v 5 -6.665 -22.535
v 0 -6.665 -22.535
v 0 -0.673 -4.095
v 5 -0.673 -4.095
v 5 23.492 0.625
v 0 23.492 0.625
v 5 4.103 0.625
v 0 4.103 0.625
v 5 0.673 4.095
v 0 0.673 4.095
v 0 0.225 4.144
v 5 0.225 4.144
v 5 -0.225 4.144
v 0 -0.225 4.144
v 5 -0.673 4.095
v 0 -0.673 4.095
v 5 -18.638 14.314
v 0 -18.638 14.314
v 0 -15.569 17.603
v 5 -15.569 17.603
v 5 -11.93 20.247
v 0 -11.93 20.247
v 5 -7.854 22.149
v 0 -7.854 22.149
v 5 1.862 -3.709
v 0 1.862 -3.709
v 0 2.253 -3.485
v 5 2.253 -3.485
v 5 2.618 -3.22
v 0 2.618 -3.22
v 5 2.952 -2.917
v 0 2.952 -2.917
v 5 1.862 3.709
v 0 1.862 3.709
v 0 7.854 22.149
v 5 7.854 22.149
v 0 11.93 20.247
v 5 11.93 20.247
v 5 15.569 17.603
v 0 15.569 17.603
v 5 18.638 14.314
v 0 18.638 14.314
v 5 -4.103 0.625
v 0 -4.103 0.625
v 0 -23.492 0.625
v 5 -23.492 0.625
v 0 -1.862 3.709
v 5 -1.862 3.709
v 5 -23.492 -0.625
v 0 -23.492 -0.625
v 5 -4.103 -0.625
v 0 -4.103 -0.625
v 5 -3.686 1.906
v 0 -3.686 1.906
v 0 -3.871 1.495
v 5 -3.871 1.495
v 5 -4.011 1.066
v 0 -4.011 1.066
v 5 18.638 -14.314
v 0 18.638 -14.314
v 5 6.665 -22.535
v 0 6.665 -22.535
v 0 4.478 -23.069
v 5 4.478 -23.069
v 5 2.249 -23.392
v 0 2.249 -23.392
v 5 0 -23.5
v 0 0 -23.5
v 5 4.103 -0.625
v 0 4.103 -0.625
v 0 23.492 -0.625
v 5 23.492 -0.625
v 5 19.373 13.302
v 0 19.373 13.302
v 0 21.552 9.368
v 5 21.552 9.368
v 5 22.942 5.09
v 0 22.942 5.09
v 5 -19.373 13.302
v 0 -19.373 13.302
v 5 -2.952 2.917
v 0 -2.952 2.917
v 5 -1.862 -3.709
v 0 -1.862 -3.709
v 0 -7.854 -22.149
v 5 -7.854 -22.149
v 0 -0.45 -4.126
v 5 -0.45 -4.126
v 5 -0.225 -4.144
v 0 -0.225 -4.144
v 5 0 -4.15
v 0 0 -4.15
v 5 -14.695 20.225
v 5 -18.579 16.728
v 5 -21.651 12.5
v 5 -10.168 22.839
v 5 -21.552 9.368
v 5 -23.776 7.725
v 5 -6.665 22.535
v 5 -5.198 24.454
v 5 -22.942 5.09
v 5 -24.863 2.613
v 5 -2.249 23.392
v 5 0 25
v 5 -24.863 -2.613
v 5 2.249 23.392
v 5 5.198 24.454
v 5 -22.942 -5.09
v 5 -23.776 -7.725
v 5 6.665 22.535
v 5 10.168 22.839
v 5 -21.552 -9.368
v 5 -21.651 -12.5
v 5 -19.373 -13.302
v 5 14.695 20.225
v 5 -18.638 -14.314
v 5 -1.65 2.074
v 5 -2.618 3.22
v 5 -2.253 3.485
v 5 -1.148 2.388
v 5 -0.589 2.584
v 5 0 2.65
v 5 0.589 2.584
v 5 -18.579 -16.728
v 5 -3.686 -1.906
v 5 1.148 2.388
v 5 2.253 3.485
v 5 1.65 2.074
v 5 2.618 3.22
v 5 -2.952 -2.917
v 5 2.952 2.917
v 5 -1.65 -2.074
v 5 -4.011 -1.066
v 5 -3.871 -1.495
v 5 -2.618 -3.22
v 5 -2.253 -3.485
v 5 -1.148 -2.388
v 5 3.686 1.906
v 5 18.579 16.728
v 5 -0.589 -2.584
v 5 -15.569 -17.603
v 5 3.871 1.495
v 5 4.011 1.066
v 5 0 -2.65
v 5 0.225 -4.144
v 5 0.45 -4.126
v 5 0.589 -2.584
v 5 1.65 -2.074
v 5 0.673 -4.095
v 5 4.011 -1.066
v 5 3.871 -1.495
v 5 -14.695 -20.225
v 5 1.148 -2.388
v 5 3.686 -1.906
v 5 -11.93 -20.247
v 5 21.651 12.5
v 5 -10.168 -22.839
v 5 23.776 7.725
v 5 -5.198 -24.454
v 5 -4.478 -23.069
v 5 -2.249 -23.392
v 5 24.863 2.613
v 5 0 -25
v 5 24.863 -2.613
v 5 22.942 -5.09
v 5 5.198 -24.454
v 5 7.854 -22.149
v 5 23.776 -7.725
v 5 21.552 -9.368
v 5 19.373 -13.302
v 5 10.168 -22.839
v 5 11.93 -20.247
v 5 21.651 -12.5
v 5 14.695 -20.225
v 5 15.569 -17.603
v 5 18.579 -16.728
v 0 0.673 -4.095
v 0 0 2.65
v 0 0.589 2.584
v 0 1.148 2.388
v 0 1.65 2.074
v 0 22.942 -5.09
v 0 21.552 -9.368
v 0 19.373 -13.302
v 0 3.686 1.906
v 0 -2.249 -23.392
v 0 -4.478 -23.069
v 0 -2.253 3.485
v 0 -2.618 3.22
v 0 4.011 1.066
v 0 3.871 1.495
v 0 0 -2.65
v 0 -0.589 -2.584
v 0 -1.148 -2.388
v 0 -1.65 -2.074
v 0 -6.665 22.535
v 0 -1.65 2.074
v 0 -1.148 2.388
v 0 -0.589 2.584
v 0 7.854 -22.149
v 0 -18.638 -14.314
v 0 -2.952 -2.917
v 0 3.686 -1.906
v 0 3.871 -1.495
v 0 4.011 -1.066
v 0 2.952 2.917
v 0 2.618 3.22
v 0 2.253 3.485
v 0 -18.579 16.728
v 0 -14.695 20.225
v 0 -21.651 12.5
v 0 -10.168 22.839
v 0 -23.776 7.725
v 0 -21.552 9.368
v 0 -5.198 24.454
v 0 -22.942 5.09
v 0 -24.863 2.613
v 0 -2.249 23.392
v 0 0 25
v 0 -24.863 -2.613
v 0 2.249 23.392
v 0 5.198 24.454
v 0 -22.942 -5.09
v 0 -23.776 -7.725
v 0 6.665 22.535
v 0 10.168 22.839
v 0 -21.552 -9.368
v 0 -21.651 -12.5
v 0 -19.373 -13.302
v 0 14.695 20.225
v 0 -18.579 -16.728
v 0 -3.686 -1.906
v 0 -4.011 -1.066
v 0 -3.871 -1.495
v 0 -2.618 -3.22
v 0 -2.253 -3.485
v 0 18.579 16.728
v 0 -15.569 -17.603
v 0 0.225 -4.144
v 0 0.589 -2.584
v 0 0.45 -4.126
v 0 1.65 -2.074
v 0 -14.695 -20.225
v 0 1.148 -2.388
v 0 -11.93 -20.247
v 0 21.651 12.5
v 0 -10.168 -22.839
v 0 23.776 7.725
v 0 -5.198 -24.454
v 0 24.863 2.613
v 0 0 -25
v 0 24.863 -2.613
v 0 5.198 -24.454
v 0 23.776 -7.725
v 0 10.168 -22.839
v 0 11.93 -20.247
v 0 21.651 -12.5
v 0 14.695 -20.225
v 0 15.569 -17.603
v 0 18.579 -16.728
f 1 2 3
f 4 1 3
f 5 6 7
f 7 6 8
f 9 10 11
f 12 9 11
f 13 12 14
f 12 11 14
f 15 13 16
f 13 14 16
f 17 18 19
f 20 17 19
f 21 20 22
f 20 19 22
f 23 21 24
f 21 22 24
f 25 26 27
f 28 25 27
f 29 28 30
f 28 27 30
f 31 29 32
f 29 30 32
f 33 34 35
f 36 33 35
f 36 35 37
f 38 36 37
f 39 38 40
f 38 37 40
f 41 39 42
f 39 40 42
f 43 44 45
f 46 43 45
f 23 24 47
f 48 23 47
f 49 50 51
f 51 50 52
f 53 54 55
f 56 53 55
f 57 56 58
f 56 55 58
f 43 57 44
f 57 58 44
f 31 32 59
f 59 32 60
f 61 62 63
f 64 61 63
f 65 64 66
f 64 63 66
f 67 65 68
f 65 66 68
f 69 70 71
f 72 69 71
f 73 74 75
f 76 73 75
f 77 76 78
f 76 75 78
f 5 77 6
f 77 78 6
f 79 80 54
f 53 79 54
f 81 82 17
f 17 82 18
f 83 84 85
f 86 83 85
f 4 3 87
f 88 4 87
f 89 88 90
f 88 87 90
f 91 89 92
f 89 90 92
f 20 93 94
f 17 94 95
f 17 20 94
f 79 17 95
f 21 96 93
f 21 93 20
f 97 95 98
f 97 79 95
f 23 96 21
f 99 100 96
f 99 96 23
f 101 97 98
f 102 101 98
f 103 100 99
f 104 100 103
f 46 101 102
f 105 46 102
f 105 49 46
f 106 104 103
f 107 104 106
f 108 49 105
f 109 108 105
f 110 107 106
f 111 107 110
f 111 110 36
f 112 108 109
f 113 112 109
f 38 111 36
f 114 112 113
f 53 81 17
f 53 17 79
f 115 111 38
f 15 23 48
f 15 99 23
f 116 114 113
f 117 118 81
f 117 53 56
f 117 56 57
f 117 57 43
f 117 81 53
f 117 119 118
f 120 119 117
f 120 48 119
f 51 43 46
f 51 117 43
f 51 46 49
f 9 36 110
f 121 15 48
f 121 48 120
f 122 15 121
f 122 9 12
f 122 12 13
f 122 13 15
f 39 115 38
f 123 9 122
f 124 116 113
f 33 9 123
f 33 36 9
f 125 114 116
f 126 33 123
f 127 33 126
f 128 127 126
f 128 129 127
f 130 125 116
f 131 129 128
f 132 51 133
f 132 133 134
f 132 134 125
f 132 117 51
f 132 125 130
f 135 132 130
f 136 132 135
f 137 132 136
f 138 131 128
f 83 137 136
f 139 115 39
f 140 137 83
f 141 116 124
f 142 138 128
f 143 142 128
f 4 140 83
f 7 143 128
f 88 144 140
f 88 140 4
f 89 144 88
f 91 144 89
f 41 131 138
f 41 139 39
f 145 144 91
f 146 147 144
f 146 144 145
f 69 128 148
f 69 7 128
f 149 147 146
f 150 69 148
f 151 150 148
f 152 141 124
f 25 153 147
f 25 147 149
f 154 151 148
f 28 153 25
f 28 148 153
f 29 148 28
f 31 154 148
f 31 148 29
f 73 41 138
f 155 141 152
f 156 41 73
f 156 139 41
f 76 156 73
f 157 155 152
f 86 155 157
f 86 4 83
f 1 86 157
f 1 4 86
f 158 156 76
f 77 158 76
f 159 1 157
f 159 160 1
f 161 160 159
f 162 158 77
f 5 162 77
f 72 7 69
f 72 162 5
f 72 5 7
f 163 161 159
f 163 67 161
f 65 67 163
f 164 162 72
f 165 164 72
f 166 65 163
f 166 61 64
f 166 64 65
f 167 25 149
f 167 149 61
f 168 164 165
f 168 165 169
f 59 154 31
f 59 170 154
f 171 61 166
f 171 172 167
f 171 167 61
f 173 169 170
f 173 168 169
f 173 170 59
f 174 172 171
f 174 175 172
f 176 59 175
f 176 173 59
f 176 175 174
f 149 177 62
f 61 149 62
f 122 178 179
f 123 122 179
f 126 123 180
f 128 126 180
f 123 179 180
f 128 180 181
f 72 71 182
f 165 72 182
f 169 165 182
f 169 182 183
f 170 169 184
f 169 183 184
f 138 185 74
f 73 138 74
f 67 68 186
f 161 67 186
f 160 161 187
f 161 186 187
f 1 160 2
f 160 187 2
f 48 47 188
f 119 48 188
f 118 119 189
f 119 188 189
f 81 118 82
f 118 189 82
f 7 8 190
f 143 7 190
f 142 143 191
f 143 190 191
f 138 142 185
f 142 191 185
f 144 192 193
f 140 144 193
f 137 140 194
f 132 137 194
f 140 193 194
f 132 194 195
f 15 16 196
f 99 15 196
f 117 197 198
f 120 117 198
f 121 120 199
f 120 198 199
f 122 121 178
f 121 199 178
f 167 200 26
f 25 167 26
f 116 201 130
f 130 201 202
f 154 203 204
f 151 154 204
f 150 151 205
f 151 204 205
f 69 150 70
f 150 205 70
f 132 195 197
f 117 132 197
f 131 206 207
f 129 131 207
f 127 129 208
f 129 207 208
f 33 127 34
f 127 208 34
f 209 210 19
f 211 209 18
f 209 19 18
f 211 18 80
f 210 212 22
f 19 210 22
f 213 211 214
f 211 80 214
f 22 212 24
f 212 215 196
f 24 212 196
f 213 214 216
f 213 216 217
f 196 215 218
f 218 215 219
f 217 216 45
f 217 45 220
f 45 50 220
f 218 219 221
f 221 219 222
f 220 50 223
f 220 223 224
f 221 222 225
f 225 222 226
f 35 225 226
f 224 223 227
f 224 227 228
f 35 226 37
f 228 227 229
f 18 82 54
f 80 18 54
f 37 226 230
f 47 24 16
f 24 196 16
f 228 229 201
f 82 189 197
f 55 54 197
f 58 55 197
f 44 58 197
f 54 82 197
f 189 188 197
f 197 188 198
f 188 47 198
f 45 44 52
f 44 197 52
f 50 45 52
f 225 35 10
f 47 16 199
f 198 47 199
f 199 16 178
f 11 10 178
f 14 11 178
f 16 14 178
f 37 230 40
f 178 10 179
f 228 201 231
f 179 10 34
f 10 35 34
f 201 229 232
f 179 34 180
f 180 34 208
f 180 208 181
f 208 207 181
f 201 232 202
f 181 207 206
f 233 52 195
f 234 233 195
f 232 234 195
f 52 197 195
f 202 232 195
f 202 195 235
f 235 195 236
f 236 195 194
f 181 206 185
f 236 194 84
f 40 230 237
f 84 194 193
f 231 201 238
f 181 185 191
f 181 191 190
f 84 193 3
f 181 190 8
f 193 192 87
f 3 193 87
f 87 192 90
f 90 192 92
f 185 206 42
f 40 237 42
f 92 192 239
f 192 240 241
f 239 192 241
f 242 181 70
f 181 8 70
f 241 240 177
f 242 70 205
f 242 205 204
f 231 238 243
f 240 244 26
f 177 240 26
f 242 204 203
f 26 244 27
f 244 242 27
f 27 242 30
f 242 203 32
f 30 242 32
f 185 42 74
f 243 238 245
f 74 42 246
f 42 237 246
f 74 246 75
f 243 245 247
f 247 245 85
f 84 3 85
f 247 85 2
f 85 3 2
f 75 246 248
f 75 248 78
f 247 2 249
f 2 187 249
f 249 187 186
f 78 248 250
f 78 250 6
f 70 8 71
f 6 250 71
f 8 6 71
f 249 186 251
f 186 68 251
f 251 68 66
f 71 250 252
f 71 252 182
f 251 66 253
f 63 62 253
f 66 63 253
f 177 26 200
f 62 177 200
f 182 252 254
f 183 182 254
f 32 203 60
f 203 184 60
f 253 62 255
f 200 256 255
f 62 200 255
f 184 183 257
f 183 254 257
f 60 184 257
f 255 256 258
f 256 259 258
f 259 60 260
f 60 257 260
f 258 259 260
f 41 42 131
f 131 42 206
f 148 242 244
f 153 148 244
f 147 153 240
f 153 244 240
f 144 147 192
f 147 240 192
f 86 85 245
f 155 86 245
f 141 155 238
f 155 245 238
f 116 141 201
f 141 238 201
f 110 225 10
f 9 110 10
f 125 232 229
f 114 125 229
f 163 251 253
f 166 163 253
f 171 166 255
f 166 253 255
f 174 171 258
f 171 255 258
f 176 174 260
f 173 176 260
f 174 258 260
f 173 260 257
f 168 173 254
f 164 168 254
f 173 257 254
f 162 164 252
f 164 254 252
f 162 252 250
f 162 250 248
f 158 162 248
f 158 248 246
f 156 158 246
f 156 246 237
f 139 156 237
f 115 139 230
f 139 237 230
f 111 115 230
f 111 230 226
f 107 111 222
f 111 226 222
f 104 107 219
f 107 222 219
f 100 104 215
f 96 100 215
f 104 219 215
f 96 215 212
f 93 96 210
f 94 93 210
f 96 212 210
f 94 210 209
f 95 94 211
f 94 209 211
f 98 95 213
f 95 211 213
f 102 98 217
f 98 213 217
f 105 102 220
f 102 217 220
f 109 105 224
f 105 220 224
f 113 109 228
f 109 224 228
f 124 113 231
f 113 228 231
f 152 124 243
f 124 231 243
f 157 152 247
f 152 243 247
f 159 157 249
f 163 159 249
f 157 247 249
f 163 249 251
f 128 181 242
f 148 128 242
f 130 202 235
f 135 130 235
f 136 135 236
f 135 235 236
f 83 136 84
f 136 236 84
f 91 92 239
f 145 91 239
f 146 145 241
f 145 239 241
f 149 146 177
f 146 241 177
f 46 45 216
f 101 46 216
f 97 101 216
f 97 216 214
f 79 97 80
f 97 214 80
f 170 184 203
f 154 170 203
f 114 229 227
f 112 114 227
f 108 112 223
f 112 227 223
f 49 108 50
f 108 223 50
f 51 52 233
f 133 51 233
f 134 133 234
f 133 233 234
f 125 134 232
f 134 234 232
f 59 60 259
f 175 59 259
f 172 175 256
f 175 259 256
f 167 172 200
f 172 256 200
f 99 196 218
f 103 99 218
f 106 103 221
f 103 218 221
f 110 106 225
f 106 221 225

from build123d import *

# Parameters (mm, degrees)
SKETCH1_R           = 25
BOSS_EXTRUDE2_DEPTH = 5


with BuildPart() as part:
    # Sketch1 → Boss-Extrude2 (new body)
    # profile 1 of 38: a face of its own
    with BuildSketch(Plane(origin=(0, 0, 0), x_dir=(0, 0, -1), z_dir=(1, 0, 0))):
        Circle(SKETCH1_R)
        with BuildLine():
            ThreePointArc((-13.30243176, 19.372540083), (-7.261899368, 22.349828133), (-0.625, 23.49168736))
            Line((-0.625, 23.49168736), (-0.625, 23.832616044))
            Line((-0.625, 23.832616044), (0.625, 23.832616044))
            Line((0.625, 23.832616044), (0.625, 23.49168736))
            ThreePointArc((0.625, 23.49168736), (7.261899368, 22.349828133), (13.30243176, 19.372540083))
            Line((13.30243176, 19.372540083), (13.502824613, 19.648357183))
            Line((13.502824613, 19.648357183), (14.514095856, 18.913625618))
            Line((14.514095856, 18.913625618), (14.313703003, 18.637808518))
            ThreePointArc((14.313703003, 18.637808518), (19.011899368, 13.812953429), (22.148786721, 7.853740943))
            Line((22.148786721, 7.853740943), (22.473029168, 7.959093701))
            Line((22.473029168, 7.959093701), (22.859300411, 6.770273055))
            Line((22.859300411, 6.770273055), (22.535057964, 6.664920298))
            ThreePointArc((22.535057964, 6.664920298), (23.257513433, 3.367204913), (23.5, 0))
            ThreePointArc((23.5, 0), (23.257513433, -3.367204913), (22.535057964, -6.664920298))
            Line((22.535057964, -6.664920298), (22.859300411, -6.770273055))
            Line((22.859300411, -6.770273055), (22.473029168, -7.959093701))
            Line((22.473029168, -7.959093701), (22.148786721, -7.853740943))
            ThreePointArc((22.148786721, -7.853740943), (19.011899368, -13.812953429), (14.313703003, -18.637808518))
            Line((14.313703003, -18.637808518), (14.514095856, -18.913625618))
            Line((14.514095856, -18.913625618), (13.502824613, -19.648357183))
            Line((13.502824613, -19.648357183), (13.30243176, -19.372540083))
            ThreePointArc((13.30243176, -19.372540083), (7.261899368, -22.349828133), (0.625, -23.49168736))
            Line((0.625, -23.49168736), (0.625, -23.832616044))
            Line((0.625, -23.832616044), (-0.625, -23.832616044))
            Line((-0.625, -23.832616044), (-0.625, -23.49168736))
            ThreePointArc((-0.625, -23.49168736), (-7.261899368, -22.349828133), (-13.30243176, -19.372540083))
            Line((-13.30243176, -19.372540083), (-13.502824613, -19.648357183))
            Line((-13.502824613, -19.648357183), (-14.514095856, -18.913625618))
            Line((-14.514095856, -18.913625618), (-14.313703003, -18.637808518))
            ThreePointArc((-14.313703003, -18.637808518), (-19.011899368, -13.812953429), (-22.148786721, -7.853740943))
            Line((-22.148786721, -7.853740943), (-22.473029168, -7.959093701))
            Line((-22.473029168, -7.959093701), (-22.859300411, -6.770273055))
            Line((-22.859300411, -6.770273055), (-22.535057964, -6.664920298))
            ThreePointArc((-22.535057964, -6.664920298), (-23.5, 0), (-22.535057964, 6.664920298))
            Line((-22.535057964, 6.664920298), (-22.859300411, 6.770273055))
            Line((-22.859300411, 6.770273055), (-22.473029168, 7.959093701))
            Line((-22.473029168, 7.959093701), (-22.148786721, 7.853740943))
            ThreePointArc((-22.148786721, 7.853740943), (-19.011899368, 13.812953429), (-14.313703003, 18.637808518))
            Line((-14.313703003, 18.637808518), (-14.514095856, 18.913625618))
            Line((-14.514095856, 18.913625618), (-13.502824613, 19.648357183))
            Line((-13.502824613, 19.648357183), (-13.30243176, 19.372540083))
        make_face(mode=Mode.SUBTRACT)
    # profile 2 of 38: a face of its own
    with BuildSketch(Plane(origin=(0, 0, 0), x_dir=(0, 0, -1), z_dir=(1, 0, 0))):
        with BuildLine():
            Line((-0.625, 23.49168736), (-0.625, 4.102666816))
            ThreePointArc((-0.625, 4.102666816), (0, 4.15), (0.625, 4.102666816))
            Line((0.625, 4.102666816), (0.625, 23.49168736))
            ThreePointArc((0.625, 23.49168736), (0, 23.5), (-0.625, 23.49168736))
        make_face()
    # profile 3 of 38: a face of its own
    with BuildSketch(Plane(origin=(0, 0, 0), x_dir=(0, 0, -1), z_dir=(1, 0, 0))):
        with BuildLine():
            Line((-0.625, 23.832616044), (-0.625, 23.49168736))
            ThreePointArc((-0.625, 23.49168736), (0, 23.5), (0.625, 23.49168736))
            Line((0.625, 23.49168736), (0.625, 23.832616044))
            Line((0.625, 23.832616044), (-0.625, 23.832616044))
        make_face()
    # profile 4 of 38: a face of its own
    with BuildSketch(Plane(origin=(0, 0, 0), x_dir=(0, 0, -1), z_dir=(1, 0, 0))):
        with BuildLine():
            ThreePointArc((-14.313703003, 18.637808518), (-13.812953429, 19.011899368), (-13.30243176, 19.372540083))
            Line((-13.30243176, 19.372540083), (-13.502824613, 19.648357183))
            Line((-13.502824613, 19.648357183), (-14.514095856, 18.913625618))
            Line((-14.514095856, 18.913625618), (-14.313703003, 18.637808518))
        make_face()
    # profile 5 of 38: a face of its own
    with BuildSketch(Plane(origin=(0, 0, 0), x_dir=(0, 0, -1), z_dir=(1, 0, 0))):
        with BuildLine():
            ThreePointArc((-2.917122671, 2.951761393), (-2.439308797, 3.357420527), (-1.905851428, 3.686492959))
            Line((-1.905851428, 3.686492959), (-13.30243176, 19.372540083))
            ThreePointArc((-13.30243176, 19.372540083), (-13.812953429, 19.011899368), (-14.313703003, 18.637808518))
            Line((-14.313703003, 18.637808518), (-2.917122671, 2.951761393))
        make_face()
    # profile 6 of 38: a face of its own
    with BuildSketch(Plane(origin=(0, 0, 0), x_dir=(0, 0, -1), z_dir=(1, 0, 0))):
        with BuildLine():
            ThreePointArc((-22.535057964, 6.664920298), (-22.349828133, 7.261899368), (-22.148786721, 7.853740943))
            Line((-22.148786721, 7.853740943), (-22.473029168, 7.959093701))
            Line((-22.473029168, 7.959093701), (-22.859300411, 6.770273055))
            Line((-22.859300411, 6.770273055), (-22.535057964, 6.664920298))
        make_face()
    # profile 7 of 38: a face of its own
    with BuildSketch(Plane(origin=(0, 0, 0), x_dir=(0, 0, -1), z_dir=(1, 0, 0))):
        with BuildLine():
            ThreePointArc((-4.095003631, 0.673383446), (-3.946884543, 1.282420527), (-3.708732388, 1.862204091))
            Line((-3.708732388, 1.862204091), (-22.148786721, 7.853740943))
            ThreePointArc((-22.148786721, 7.853740943), (-22.349828133, 7.261899368), (-22.535057964, 6.664920298))
            Line((-22.535057964, 6.664920298), (-4.095003631, 0.673383446))
        make_face()
    # profile 8 of 38: a face of its own
    with BuildSketch(Plane(origin=(0, 0, 0), x_dir=(0, 0, -1), z_dir=(1, 0, 0))):
        with BuildLine():
            ThreePointArc((-22.148786721, -7.853740943), (-22.349828133, -7.261899368), (-22.535057964, -6.664920298))
            Line((-22.535057964, -6.664920298), (-22.859300411, -6.770273055))
            Line((-22.859300411, -6.770273055), (-22.473029168, -7.959093701))
            Line((-22.473029168, -7.959093701), (-22.148786721, -7.853740943))
        make_face()
    # profile 9 of 38: a face of its own
    with BuildSketch(Plane(origin=(0, 0, 0), x_dir=(0, 0, -1), z_dir=(1, 0, 0))):
        with BuildLine():
            ThreePointArc((-13.30243176, -19.372540083), (-13.812953429, -19.011899368), (-14.313703003, -18.637808518))
            Line((-14.313703003, -18.637808518), (-14.514095856, -18.913625618))
            Line((-14.514095856, -18.913625618), (-13.502824613, -19.648357183))
            Line((-13.502824613, -19.648357183), (-13.30243176, -19.372540083))
        make_face()
    # profile 10 of 38: a face of its own
    with BuildSketch(Plane(origin=(0, 0, 0), x_dir=(0, 0, -1), z_dir=(1, 0, 0))):
        with BuildLine():
            ThreePointArc((-1.905851428, -3.686492959), (-2.439308797, -3.357420527), (-2.917122671, -2.951761393))
            Line((-2.917122671, -2.951761393), (-14.313703003, -18.637808518))
            ThreePointArc((-14.313703003, -18.637808518), (-13.812953429, -19.011899368), (-13.30243176, -19.372540083))
            Line((-13.30243176, -19.372540083), (-1.905851428, -3.686492959))
        make_face()
    # profile 11 of 38: a face of its own
    with BuildSketch(Plane(origin=(0, 0, 0), x_dir=(0, 0, -1), z_dir=(1, 0, 0))):
        with BuildLine():
            ThreePointArc((-3.708732388, -1.862204091), (-3.946884543, -1.282420527), (-4.095003631, -0.673383446))
            Line((-4.095003631, -0.673383446), (-22.535057964, -6.664920298))
            ThreePointArc((-22.535057964, -6.664920298), (-22.349828133, -7.261899368), (-22.148786721, -7.853740943))
            Line((-22.148786721, -7.853740943), (-3.708732388, -1.862204091))
        make_face()
    # profile 12 of 38: a face of its own
    with BuildSketch(Plane(origin=(0, 0, 0), x_dir=(0, 0, -1), z_dir=(1, 0, 0))):
        with BuildLine():
            ThreePointArc((0.625, -23.49168736), (0, -23.5), (-0.625, -23.49168736))
            Line((-0.625, -23.49168736), (-0.625, -23.832616044))
            Line((-0.625, -23.832616044), (0.625, -23.832616044))
            Line((0.625, -23.832616044), (0.625, -23.49168736))
        make_face()
    # profile 13 of 38: a face of its own
    with BuildSketch(Plane(origin=(0, 0, 0), x_dir=(0, 0, -1), z_dir=(1, 0, 0))):
        with BuildLine():
            ThreePointArc((0.625, -4.102666816), (0, -4.15), (-0.625, -4.102666816))
            Line((-0.625, -4.102666816), (-0.625, -23.49168736))
            ThreePointArc((-0.625, -23.49168736), (0, -23.5), (0.625, -23.49168736))
            Line((0.625, -23.49168736), (0.625, -4.102666816))
        make_face()
    # profile 14 of 38: a face of its own
    with BuildSketch(Plane(origin=(0, 0, 0), x_dir=(0, 0, -1), z_dir=(1, 0, 0))):
        with BuildLine():
            Line((14.514095856, -18.913625618), (14.313703003, -18.637808518))
            ThreePointArc((14.313703003, -18.637808518), (13.812953429, -19.011899368), (13.30243176, -19.372540083))
            Line((13.30243176, -19.372540083), (13.502824613, -19.648357183))
            Line((13.502824613, -19.648357183), (14.514095856, -18.913625618))
        make_face()
    # profile 15 of 38: a face of its own
    with BuildSketch(Plane(origin=(0, 0, 0), x_dir=(0, 0, -1), z_dir=(1, 0, 0))):
        with BuildLine():
            Line((14.313703003, -18.637808518), (2.917122671, -2.951761393))
            ThreePointArc((2.917122671, -2.951761393), (2.439308797, -3.357420527), (1.905851428, -3.686492959))
            Line((1.905851428, -3.686492959), (13.30243176, -19.372540083))
            ThreePointArc((13.30243176, -19.372540083), (13.812953429, -19.011899368), (14.313703003, -18.637808518))
        make_face()
    # profile 16 of 38: a face of its own
    with BuildSketch(Plane(origin=(0, 0, 0), x_dir=(0, 0, -1), z_dir=(1, 0, 0))):
        with BuildLine():
            Line((22.859300411, -6.770273055), (22.535057964, -6.664920298))
            ThreePointArc((22.535057964, -6.664920298), (22.349828133, -7.261899368), (22.148786721, -7.853740943))
            Line((22.148786721, -7.853740943), (22.473029168, -7.959093701))
            Line((22.473029168, -7.959093701), (22.859300411, -6.770273055))
        make_face()
    # profile 17 of 38: a face of its own
    with BuildSketch(Plane(origin=(0, 0, 0), x_dir=(0, 0, -1), z_dir=(1, 0, 0))):
        with BuildLine():
            Line((22.535057964, -6.664920298), (4.095003631, -0.673383446))
            ThreePointArc((4.095003631, -0.673383446), (3.946884543, -1.282420527), (3.708732388, -1.862204091))
            Line((3.708732388, -1.862204091), (22.148786721, -7.853740943))
            ThreePointArc((22.148786721, -7.853740943), (22.349828133, -7.261899368), (22.535057964, -6.664920298))
        make_face()
    # profile 18 of 38: a face of its own
    with BuildSketch(Plane(origin=(0, 0, 0), x_dir=(0, 0, -1), z_dir=(1, 0, 0))):
        with BuildLine():
            Line((22.473029168, 7.959093701), (22.148786721, 7.853740943))
            ThreePointArc((22.148786721, 7.853740943), (22.349828133, 7.261899368), (22.535057964, 6.664920298))
            Line((22.535057964, 6.664920298), (22.859300411, 6.770273055))
            Line((22.859300411, 6.770273055), (22.473029168, 7.959093701))
        make_face()
    # profile 19 of 38: a face of its own
    with BuildSketch(Plane(origin=(0, 0, 0), x_dir=(0, 0, -1), z_dir=(1, 0, 0))):
        with BuildLine():
            Line((22.148786721, 7.853740943), (3.708732388, 1.862204091))
            ThreePointArc((3.708732388, 1.862204091), (3.946884543, 1.282420527), (4.095003631, 0.673383446))
            Line((4.095003631, 0.673383446), (22.535057964, 6.664920298))
            ThreePointArc((22.535057964, 6.664920298), (22.349828133, 7.261899368), (22.148786721, 7.853740943))
        make_face()
    # profile 20 of 38: a face of its own
    with BuildSketch(Plane(origin=(0, 0, 0), x_dir=(0, 0, -1), z_dir=(1, 0, 0))):
        with BuildLine():
            Line((13.502824613, 19.648357183), (13.30243176, 19.372540083))
            ThreePointArc((13.30243176, 19.372540083), (13.812953429, 19.011899368), (14.313703003, 18.637808518))
            Line((14.313703003, 18.637808518), (14.514095856, 18.913625618))
            Line((14.514095856, 18.913625618), (13.502824613, 19.648357183))
        make_face()
    # profile 21 of 38: a face of its own
    with BuildSketch(Plane(origin=(0, 0, 0), x_dir=(0, 0, -1), z_dir=(1, 0, 0))):
        with BuildLine():
            Line((13.30243176, 19.372540083), (1.905851428, 3.686492959))
            ThreePointArc((1.905851428, 3.686492959), (2.439308797, 3.357420527), (2.917122671, 2.951761393))
            Line((2.917122671, 2.951761393), (14.313703003, 18.637808518))
            ThreePointArc((14.313703003, 18.637808518), (13.812953429, 19.011899368), (13.30243176, 19.372540083))
        make_face()
    # profile 22 of 38: a face of its own
    with BuildSketch(Plane(origin=(0, 0, 0), x_dir=(0, 0, -1), z_dir=(1, 0, 0))):
        with BuildLine():
            Line((-3.838170085, -0.589933168), (-4.095003631, -0.673383446))
            ThreePointArc((-4.095003631, -0.673383446), (-3.946884543, -1.282420527), (-3.708732388, -1.862204091))
            Line((-3.708732388, -1.862204091), (-3.451898842, -1.778753813))
            Line((-3.451898842, -1.778753813), (-3.838170085, -0.589933168))
        make_face()
    # profile 23 of 38: a face of its own
    with BuildSketch(Plane(origin=(0, 0, 0), x_dir=(0, 0, -1), z_dir=(1, 0, 0))):
        with BuildLine():
            Line((-2.75839081, -2.73328573), (-2.917122671, -2.951761393))
            ThreePointArc((-2.917122671, -2.951761393), (-2.439308797, -3.357420527), (-1.905851428, -3.686492959))
            Line((-1.905851428, -3.686492959), (-1.747119567, -3.468017295))
            Line((-1.747119567, -3.468017295), (-2.75839081, -2.73328573))
        make_face()
    # profile 24 of 38: a face of its own
    with BuildSketch(Plane(origin=(0, 0, 0), x_dir=(0, 0, -1), z_dir=(1, 0, 0))):
        with BuildLine():
            Line((-0.625, -3.832616044), (-0.625, -4.102666816))
            ThreePointArc((-0.625, -4.102666816), (0, -4.15), (0.625, -4.102666816))
            Line((0.625, -4.102666816), (0.625, -3.832616044))
            Line((0.625, -3.832616044), (-0.625, -3.832616044))
        make_face()
    # profile 25 of 38: a face of its own
    with BuildSketch(Plane(origin=(0, 0, 0), x_dir=(0, 0, -1), z_dir=(1, 0, 0))):
        with BuildLine():
            ThreePointArc((1.905851428, -3.686492959), (2.439308797, -3.357420527), (2.917122671, -2.951761393))
            Line((2.917122671, -2.951761393), (2.75839081, -2.73328573))
            Line((2.75839081, -2.73328573), (1.747119567, -3.468017295))
            Line((1.747119567, -3.468017295), (1.905851428, -3.686492959))
        make_face()
    # profile 26 of 38: a face of its own
    with BuildSketch(Plane(origin=(0, 0, 0), x_dir=(0, 0, -1), z_dir=(1, 0, 0))):
        with BuildLine():
            ThreePointArc((3.708732388, -1.862204091), (3.946884543, -1.282420527), (4.095003631, -0.673383446))
            Line((4.095003631, -0.673383446), (3.838170085, -0.589933168))
            Line((3.838170085, -0.589933168), (3.451898842, -1.778753813))
            Line((3.451898842, -1.778753813), (3.708732388, -1.862204091))
        make_face()
    # profile 27 of 38: a face of its own
    with BuildSketch(Plane(origin=(0, 0, 0), x_dir=(0, 0, -1), z_dir=(1, 0, 0))):
        with BuildLine():
            ThreePointArc((4.095003631, 0.673383446), (3.946884543, 1.282420527), (3.708732388, 1.862204091))
            Line((3.708732388, 1.862204091), (3.451898842, 1.778753813))
            Line((3.451898842, 1.778753813), (3.838170085, 0.589933168))
            Line((3.838170085, 0.589933168), (4.095003631, 0.673383446))
        make_face()
    # profile 28 of 38: a face of its own
    with BuildSketch(Plane(origin=(0, 0, 0), x_dir=(0, 0, -1), z_dir=(1, 0, 0))):
        with BuildLine():
            ThreePointArc((2.917122671, 2.951761393), (2.439308797, 3.357420527), (1.905851428, 3.686492959))
            Line((1.905851428, 3.686492959), (1.747119567, 3.468017295))
            Line((1.747119567, 3.468017295), (2.75839081, 2.73328573))
            Line((2.75839081, 2.73328573), (2.917122671, 2.951761393))
        make_face()
    # profile 29 of 38: a face of its own
    with BuildSketch(Plane(origin=(0, 0, 0), x_dir=(0, 0, -1), z_dir=(1, 0, 0))):
        with BuildLine():
            Line((-0.625, 4.102666816), (-0.625, 3.832616044))
            Line((-0.625, 3.832616044), (0.625, 3.832616044))
            Line((0.625, 3.832616044), (0.625, 4.102666816))
            ThreePointArc((0.625, 4.102666816), (0, 4.15), (-0.625, 4.102666816))
        make_face()
    # profile 30 of 38: a face of its own
    with BuildSketch(Plane(origin=(0, 0, 0), x_dir=(0, 0, -1), z_dir=(1, 0, 0))):
        with BuildLine():
            Line((-1.747119567, 3.468017295), (-1.905851428, 3.686492959))
            ThreePointArc((-1.905851428, 3.686492959), (-2.439308797, 3.357420527), (-2.917122671, 2.951761393))
            Line((-2.917122671, 2.951761393), (-2.75839081, 2.73328573))
            Line((-2.75839081, 2.73328573), (-1.747119567, 3.468017295))
        make_face()
    # profile 31 of 38: a face of its own
    with BuildSketch(Plane(origin=(0, 0, 0), x_dir=(0, 0, -1), z_dir=(1, 0, 0))):
        with BuildLine():
            Line((-3.451898842, 1.778753813), (-3.708732388, 1.862204091))
            ThreePointArc((-3.708732388, 1.862204091), (-3.946884543, 1.282420527), (-4.095003631, 0.673383446))
            Line((-4.095003631, 0.673383446), (-3.838170085, 0.589933168))
            Line((-3.838170085, 0.589933168), (-3.451898842, 1.778753813))
        make_face()
    # profile 32 of 38: a face of its own
    with BuildSketch(Plane(origin=(0, 0, 0), x_dir=(0, 0, -1), z_dir=(1, 0, 0))):
        with BuildLine():
            Line((0.625, 3.832616044), (-0.625, 3.832616044))
            Line((-0.625, 3.832616044), (-0.625, 4.102666816))
            ThreePointArc((-0.625, 4.102666816), (-1.282420527, 3.946884543), (-1.905851428, 3.686492959))
            Line((-1.905851428, 3.686492959), (-1.747119567, 3.468017295))
            Line((-1.747119567, 3.468017295), (-2.75839081, 2.73328573))
            Line((-2.75839081, 2.73328573), (-2.917122671, 2.951761393))
            ThreePointArc((-2.917122671, 2.951761393), (-3.357420527, 2.439308797), (-3.708732388, 1.862204091))
            Line((-3.708732388, 1.862204091), (-3.451898842, 1.778753813))
            Line((-3.451898842, 1.778753813), (-3.838170085, 0.589933168))
            Line((-3.838170085, 0.589933168), (-4.095003631, 0.673383446))
            ThreePointArc((-4.095003631, 0.673383446), (-4.15, 0), (-4.095003631, -0.673383446))
            Line((-4.095003631, -0.673383446), (-3.838170085, -0.589933168))
            Line((-3.838170085, -0.589933168), (-3.451898842, -1.778753813))
            Line((-3.451898842, -1.778753813), (-3.708732388, -1.862204091))
            ThreePointArc((-3.708732388, -1.862204091), (-3.357420527, -2.439308797), (-2.917122671, -2.951761393))
            Line((-2.917122671, -2.951761393), (-2.75839081, -2.73328573))
            Line((-2.75839081, -2.73328573), (-1.747119567, -3.468017295))
            Line((-1.747119567, -3.468017295), (-1.905851428, -3.686492959))
            ThreePointArc((-1.905851428, -3.686492959), (-1.282420527, -3.946884543), (-0.625, -4.102666816))
            Line((-0.625, -4.102666816), (-0.625, -3.832616044))
            Line((-0.625, -3.832616044), (0.625, -3.832616044))
            Line((0.625, -3.832616044), (0.625, -4.102666816))
            ThreePointArc((0.625, -4.102666816), (1.282420527, -3.946884543), (1.905851428, -3.686492959))
            Line((1.905851428, -3.686492959), (1.747119567, -3.468017295))
            Line((1.747119567, -3.468017295), (2.75839081, -2.73328573))
            Line((2.75839081, -2.73328573), (2.917122671, -2.951761393))
            ThreePointArc((2.917122671, -2.951761393), (3.357420527, -2.439308797), (3.708732388, -1.862204091))
            Line((3.708732388, -1.862204091), (3.451898842, -1.778753813))
            Line((3.451898842, -1.778753813), (3.838170085, -0.589933168))
            Line((3.838170085, -0.589933168), (4.095003631, -0.673383446))
            ThreePointArc((4.095003631, -0.673383446), (4.136228056, -0.337812768), (4.15, 0))
            ThreePointArc((4.15, 0), (4.136228056, 0.337812768), (4.095003631, 0.673383446))
            Line((4.095003631, 0.673383446), (3.838170085, 0.589933168))
            Line((3.838170085, 0.589933168), (3.451898842, 1.778753813))
            Line((3.451898842, 1.778753813), (3.708732388, 1.862204091))
            ThreePointArc((3.708732388, 1.862204091), (3.357420527, 2.439308797), (2.917122671, 2.951761393))
            Line((2.917122671, 2.951761393), (2.75839081, 2.73328573))
            Line((2.75839081, 2.73328573), (1.747119567, 3.468017295))
            Line((1.747119567, 3.468017295), (1.905851428, 3.686492959))
            ThreePointArc((1.905851428, 3.686492959), (1.282420527, 3.946884543), (0.625, 4.102666816))
            Line((0.625, 4.102666816), (0.625, 3.832616044))
        make_face()
        with BuildLine():
            Line((-2.073644135, -1.65), (-2.65, -1.65))
            Line((-2.65, -1.65), (-2.65, 0))
            Line((-2.65, 0), (-2.65, 1.65))
            Line((-2.65, 1.65), (-2.073644135, 1.65))
            ThreePointArc((-2.073644135, 1.65), (0, 2.65), (2.073644135, 1.65))
            Line((2.073644135, 1.65), (2.65, 1.65))
            Line((2.65, 1.65), (2.65, 0))
            Line((2.65, 0), (2.65, -1.65))
            Line((2.65, -1.65), (2.073644135, -1.65))
            ThreePointArc((2.073644135, -1.65), (0, -2.65), (-2.073644135, -1.65))
        make_face(mode=Mode.SUBTRACT)
    # profile 33 of 38: a face of its own
    with BuildSketch(Plane(origin=(0, 0, 0), x_dir=(0, 0, -1), z_dir=(1, 0, 0))):
        with BuildLine():
            ThreePointArc((2.073644135, 1.65), (2.501765073, 0.873883013), (2.65, 0))
            Line((2.65, 0), (2.65, 1.65))
            Line((2.65, 1.65), (2.073644135, 1.65))
        make_face()
    # profile 34 of 38: a face of its own
    with BuildSketch(Plane(origin=(0, 0, 0), x_dir=(0, 0, -1), z_dir=(1, 0, 0))):
        with BuildLine():
            ThreePointArc((2.65, 0), (2.501765073, -0.873883013), (2.073644135, -1.65))
            Line((2.073644135, -1.65), (2.65, -1.65))
            Line((2.65, -1.65), (2.65, 0))
        make_face()
    # profile 35 of 38: a face of its own
    with BuildSketch(Plane(origin=(0, 0, 0), x_dir=(0, 0, -1), z_dir=(1, 0, 0))):
        with BuildLine():
            Line((2.073644135, -1.65), (-2.073644135, -1.65))
            ThreePointArc((-2.073644135, -1.65), (0, -2.65), (2.073644135, -1.65))
        make_face()
    # profile 36 of 38: a face of its own
    with BuildSketch(Plane(origin=(0, 0, 0), x_dir=(0, 0, -1), z_dir=(1, 0, 0))):
        with BuildLine():
            Line((-2.65, 0), (-2.65, -1.65))
            Line((-2.65, -1.65), (-2.073644135, -1.65))
            ThreePointArc((-2.073644135, -1.65), (-2.501765073, -0.873883013), (-2.65, 0))
        make_face()
    # profile 37 of 38: a face of its own
    with BuildSketch(Plane(origin=(0, 0, 0), x_dir=(0, 0, -1), z_dir=(1, 0, 0))):
        with BuildLine():
            Line((-2.65, 1.65), (-2.65, 0))
            ThreePointArc((-2.65, 0), (-2.501765073, 0.873883013), (-2.073644135, 1.65))
            Line((-2.073644135, 1.65), (-2.65, 1.65))
        make_face()
    # profile 38 of 38: a face of its own
    with BuildSketch(Plane(origin=(0, 0, 0), x_dir=(0, 0, -1), z_dir=(1, 0, 0))):
        with BuildLine():
            ThreePointArc((2.073644135, 1.65), (0, 2.65), (-2.073644135, 1.65))
            Line((-2.073644135, 1.65), (2.073644135, 1.65))
        make_face()
    extrude(amount=BOSS_EXTRUDE2_DEPTH)


solid = part.part
